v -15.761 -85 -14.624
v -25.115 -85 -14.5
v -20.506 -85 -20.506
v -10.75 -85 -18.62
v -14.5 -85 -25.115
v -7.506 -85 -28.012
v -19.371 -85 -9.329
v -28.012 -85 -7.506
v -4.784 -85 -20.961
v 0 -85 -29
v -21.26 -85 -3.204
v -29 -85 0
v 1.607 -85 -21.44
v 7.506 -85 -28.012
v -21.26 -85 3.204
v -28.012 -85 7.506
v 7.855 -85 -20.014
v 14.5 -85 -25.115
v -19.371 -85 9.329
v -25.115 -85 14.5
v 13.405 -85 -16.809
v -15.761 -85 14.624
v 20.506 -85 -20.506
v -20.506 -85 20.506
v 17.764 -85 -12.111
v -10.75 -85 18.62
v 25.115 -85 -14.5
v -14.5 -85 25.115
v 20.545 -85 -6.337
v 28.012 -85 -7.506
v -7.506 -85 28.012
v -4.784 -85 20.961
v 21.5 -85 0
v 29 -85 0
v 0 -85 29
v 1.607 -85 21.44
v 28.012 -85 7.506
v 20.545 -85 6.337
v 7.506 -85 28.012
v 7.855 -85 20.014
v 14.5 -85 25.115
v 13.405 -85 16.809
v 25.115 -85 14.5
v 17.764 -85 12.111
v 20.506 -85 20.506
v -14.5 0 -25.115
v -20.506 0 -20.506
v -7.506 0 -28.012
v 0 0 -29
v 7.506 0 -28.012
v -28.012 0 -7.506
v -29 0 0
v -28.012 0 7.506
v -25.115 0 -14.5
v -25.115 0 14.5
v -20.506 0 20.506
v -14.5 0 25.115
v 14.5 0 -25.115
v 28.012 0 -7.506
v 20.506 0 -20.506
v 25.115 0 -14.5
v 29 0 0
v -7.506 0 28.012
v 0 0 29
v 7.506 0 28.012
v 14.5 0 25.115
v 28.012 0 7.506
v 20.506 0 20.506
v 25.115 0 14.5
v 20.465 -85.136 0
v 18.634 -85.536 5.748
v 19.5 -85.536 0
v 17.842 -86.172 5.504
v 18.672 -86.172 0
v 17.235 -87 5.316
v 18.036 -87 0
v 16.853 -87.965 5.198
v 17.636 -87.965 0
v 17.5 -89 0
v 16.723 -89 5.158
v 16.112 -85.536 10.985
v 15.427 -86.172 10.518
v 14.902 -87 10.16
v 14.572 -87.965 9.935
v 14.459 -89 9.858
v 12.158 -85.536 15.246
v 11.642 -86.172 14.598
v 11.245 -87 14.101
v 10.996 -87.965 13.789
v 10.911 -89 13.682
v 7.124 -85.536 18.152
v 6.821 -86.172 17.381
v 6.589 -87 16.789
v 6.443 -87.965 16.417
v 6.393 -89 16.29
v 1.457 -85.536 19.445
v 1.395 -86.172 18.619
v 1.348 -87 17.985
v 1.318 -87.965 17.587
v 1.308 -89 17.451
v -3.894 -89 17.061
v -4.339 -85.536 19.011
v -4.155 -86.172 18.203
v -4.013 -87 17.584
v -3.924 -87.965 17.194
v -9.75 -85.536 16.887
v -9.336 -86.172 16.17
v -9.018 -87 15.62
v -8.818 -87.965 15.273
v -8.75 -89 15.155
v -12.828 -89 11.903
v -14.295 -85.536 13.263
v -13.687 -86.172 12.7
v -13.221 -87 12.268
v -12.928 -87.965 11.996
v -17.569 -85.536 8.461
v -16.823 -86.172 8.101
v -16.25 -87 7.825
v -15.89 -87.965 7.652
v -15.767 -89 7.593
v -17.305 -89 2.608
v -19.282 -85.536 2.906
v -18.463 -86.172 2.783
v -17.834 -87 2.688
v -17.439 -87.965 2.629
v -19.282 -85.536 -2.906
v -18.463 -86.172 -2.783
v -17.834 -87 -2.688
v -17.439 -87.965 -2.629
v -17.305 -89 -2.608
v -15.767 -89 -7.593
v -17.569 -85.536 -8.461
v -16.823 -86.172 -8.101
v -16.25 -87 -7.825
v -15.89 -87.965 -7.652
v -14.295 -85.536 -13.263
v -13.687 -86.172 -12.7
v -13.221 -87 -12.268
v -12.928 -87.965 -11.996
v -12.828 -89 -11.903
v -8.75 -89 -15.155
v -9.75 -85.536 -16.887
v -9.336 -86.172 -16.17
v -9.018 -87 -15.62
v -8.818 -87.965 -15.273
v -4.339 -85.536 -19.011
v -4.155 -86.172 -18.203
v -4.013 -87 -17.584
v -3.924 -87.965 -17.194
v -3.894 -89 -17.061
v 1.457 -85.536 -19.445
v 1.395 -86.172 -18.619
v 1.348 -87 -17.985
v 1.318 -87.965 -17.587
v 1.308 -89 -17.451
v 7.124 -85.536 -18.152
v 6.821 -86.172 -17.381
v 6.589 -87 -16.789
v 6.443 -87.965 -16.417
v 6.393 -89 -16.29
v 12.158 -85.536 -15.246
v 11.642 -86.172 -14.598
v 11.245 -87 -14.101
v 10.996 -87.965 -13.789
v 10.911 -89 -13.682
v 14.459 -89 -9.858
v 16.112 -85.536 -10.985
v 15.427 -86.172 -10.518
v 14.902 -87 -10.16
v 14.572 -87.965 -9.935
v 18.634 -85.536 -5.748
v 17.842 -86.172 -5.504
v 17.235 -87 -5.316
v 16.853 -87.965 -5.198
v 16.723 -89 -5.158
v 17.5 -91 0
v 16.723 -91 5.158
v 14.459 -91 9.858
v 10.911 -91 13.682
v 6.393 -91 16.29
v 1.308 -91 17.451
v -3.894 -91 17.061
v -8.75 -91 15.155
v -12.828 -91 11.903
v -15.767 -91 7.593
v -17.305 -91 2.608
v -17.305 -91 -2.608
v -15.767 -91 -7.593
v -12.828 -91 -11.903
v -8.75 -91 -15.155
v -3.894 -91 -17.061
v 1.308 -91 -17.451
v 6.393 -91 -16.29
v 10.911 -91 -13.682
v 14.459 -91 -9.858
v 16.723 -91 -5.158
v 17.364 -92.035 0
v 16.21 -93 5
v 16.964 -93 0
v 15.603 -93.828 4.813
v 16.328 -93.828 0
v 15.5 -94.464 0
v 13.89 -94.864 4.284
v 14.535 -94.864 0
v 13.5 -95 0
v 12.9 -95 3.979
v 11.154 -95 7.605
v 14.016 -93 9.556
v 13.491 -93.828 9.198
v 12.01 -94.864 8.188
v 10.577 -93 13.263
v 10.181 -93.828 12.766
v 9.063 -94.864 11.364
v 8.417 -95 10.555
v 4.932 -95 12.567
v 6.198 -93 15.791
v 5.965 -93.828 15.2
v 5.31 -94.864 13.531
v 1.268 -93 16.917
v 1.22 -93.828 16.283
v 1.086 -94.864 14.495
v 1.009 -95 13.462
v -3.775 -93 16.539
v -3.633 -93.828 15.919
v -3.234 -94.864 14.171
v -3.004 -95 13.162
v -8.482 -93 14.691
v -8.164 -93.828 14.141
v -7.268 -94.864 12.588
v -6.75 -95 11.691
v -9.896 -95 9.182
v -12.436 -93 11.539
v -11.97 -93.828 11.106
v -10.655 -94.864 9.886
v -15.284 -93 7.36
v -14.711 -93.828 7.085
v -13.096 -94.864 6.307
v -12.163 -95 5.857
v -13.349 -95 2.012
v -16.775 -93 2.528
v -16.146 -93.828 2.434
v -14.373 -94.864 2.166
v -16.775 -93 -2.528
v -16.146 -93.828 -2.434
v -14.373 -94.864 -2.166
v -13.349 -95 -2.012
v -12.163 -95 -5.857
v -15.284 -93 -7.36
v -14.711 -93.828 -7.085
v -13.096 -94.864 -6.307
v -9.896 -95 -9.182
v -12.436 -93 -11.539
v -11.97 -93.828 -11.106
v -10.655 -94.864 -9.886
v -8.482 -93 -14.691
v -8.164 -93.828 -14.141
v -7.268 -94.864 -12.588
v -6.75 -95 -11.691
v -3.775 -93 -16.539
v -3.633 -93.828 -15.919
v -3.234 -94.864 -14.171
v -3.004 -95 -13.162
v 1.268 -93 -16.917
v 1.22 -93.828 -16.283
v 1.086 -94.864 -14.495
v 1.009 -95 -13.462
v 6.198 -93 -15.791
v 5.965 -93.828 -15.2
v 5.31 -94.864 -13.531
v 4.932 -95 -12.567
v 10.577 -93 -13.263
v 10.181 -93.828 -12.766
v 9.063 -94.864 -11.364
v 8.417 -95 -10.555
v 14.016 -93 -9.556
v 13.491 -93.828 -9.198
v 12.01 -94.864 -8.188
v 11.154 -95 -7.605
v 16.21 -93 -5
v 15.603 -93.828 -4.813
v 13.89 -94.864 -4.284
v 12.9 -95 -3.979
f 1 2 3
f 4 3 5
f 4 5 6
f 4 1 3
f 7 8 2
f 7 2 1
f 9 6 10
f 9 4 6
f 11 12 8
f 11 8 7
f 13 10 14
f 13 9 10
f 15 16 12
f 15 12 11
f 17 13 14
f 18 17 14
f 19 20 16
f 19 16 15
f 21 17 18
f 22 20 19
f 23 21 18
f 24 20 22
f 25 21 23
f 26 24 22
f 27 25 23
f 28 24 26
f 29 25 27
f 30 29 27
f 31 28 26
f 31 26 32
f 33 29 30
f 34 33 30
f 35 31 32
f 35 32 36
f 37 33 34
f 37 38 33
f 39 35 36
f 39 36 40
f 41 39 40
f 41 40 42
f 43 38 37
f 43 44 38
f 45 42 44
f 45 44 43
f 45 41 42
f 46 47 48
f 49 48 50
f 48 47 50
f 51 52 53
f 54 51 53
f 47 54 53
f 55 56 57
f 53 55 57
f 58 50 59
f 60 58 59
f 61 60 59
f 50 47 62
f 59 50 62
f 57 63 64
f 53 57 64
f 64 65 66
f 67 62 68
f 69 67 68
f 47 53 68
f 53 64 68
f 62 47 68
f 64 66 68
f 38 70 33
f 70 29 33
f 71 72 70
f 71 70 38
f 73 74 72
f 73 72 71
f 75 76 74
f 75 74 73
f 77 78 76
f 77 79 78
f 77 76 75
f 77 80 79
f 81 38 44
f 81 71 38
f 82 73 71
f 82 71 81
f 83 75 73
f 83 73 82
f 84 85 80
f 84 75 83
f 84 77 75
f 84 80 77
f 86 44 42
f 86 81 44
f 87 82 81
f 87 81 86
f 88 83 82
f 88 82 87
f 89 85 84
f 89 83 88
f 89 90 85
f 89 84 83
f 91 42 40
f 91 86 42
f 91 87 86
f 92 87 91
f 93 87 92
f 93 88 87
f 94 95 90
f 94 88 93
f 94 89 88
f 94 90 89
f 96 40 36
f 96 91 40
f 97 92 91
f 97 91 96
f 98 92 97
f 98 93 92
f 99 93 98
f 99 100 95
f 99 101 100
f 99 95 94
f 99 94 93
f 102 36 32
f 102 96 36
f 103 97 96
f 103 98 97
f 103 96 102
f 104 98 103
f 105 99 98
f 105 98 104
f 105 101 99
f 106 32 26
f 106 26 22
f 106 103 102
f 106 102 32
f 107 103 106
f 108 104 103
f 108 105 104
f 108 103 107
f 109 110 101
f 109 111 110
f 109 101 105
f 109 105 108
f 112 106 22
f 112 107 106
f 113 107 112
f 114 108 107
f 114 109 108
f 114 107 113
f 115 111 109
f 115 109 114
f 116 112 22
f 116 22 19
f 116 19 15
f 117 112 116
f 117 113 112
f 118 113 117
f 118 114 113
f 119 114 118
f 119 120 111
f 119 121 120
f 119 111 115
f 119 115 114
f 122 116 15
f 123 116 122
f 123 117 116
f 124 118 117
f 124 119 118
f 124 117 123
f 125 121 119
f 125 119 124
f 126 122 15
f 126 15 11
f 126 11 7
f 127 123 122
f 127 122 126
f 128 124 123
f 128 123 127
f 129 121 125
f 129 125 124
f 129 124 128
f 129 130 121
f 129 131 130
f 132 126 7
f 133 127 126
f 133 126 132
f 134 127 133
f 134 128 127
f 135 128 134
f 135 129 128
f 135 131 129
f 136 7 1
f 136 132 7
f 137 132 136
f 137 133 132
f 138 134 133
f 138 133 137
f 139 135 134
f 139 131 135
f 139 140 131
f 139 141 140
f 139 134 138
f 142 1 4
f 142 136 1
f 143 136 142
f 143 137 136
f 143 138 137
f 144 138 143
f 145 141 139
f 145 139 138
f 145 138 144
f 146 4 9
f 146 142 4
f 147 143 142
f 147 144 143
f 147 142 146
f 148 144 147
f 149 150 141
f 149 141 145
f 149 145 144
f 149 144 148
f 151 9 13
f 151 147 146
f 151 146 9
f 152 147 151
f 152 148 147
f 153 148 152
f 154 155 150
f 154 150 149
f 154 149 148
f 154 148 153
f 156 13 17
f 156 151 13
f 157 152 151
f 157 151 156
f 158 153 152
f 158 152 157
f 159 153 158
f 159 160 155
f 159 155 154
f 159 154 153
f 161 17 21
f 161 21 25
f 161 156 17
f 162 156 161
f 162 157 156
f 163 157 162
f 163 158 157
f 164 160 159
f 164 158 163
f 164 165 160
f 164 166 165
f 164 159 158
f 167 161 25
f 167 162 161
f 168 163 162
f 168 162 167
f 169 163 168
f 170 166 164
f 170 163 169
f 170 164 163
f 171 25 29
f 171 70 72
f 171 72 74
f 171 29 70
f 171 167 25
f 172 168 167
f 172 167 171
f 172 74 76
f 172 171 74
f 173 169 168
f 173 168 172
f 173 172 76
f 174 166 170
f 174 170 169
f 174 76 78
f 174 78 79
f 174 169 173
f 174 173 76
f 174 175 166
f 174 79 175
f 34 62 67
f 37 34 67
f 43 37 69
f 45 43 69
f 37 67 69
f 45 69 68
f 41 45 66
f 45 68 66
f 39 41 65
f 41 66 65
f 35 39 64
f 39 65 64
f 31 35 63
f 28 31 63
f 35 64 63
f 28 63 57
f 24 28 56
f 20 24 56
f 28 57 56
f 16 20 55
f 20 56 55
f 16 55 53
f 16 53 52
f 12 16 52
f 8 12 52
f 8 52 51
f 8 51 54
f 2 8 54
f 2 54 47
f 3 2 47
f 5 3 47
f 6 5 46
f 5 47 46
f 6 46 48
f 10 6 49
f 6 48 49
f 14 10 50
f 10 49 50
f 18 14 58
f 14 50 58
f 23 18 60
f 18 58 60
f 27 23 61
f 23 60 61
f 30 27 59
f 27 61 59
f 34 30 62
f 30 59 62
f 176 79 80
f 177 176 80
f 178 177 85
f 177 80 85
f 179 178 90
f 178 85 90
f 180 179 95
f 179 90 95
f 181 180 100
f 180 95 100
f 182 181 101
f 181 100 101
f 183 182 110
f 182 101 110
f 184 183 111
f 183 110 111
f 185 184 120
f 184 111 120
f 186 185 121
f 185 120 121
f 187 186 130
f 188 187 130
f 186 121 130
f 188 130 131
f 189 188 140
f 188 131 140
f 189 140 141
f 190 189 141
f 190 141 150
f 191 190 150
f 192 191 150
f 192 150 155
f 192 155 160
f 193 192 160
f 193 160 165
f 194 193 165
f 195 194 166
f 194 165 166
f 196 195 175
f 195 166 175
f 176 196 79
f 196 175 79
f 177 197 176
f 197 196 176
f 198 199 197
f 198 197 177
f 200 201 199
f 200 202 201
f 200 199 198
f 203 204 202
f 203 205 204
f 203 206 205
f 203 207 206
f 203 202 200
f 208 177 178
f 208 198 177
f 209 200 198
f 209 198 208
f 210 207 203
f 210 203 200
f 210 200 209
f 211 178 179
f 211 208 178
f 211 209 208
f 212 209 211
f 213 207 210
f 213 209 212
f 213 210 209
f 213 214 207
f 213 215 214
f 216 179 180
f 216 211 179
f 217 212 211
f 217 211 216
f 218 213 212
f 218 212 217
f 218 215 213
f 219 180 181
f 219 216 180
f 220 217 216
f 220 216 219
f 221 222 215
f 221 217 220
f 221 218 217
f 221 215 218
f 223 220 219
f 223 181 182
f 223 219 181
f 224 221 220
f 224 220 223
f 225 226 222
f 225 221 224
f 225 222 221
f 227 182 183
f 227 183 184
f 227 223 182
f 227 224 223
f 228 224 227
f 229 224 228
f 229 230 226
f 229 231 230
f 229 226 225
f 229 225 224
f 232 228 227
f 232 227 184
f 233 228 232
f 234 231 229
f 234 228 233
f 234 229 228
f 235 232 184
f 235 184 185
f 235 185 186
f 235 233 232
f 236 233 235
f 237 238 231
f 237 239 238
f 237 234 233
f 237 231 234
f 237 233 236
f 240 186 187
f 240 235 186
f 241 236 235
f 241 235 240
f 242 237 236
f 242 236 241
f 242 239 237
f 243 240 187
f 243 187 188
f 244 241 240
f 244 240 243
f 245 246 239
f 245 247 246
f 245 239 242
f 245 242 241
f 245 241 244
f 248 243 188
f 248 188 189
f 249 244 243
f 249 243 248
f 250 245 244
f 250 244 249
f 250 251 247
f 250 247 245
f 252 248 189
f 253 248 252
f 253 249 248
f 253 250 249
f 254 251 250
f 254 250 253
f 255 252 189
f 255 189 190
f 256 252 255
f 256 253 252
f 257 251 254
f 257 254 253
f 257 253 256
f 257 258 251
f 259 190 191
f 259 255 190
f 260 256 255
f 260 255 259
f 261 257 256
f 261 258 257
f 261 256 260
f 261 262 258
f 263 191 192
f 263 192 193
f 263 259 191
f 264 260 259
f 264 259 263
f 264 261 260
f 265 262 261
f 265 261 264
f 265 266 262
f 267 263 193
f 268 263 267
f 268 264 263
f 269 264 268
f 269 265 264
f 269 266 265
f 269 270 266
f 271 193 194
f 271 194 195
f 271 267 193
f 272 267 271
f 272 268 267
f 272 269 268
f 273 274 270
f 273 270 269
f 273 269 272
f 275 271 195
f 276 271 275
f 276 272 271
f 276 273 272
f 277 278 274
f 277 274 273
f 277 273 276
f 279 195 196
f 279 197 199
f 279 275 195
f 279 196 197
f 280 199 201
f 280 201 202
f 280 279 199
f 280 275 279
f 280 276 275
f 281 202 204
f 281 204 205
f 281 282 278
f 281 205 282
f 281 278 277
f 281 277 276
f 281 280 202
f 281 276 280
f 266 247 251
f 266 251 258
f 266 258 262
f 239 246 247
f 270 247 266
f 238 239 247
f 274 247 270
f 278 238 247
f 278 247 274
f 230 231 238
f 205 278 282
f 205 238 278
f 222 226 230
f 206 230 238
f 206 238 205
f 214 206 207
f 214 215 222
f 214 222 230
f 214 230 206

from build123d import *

# Parameters (mm, degrees)
SKETCH_R     = 29
PAD_DEPTH    = 85
SKETCH001_R  = 17.5
PAD001_DEPTH = 10
FILLET_R     = 4
FILLET001_R  = 4


with BuildPart() as part:
    # Sketch (on XZ_Plane of Origin) → Pad (new body)
    with BuildSketch(Plane.XZ):
        Circle(SKETCH_R)
    extrude(amount=PAD_DEPTH)

    # Sketch001 (on Face3 of Pad) → Pad001 (join)
    with BuildSketch(Plane.XZ.offset(85)):
        Circle(SKETCH001_R)
    extrude(amount=PAD001_DEPTH)

    # Fillet
    fillet_edges = [part.edges().sort_by_distance(p)[0] for p in [
        (-17.5, -85, 0),
    ]]
    fillet(fillet_edges, radius=FILLET_R)

    # Fillet001
    fillet001_edges = [part.edges().sort_by_distance(p)[0] for p in [
        (-17.5, -95, 0),
    ]]
    fillet(fillet001_edges, radius=FILLET001_R)


solid = part.part
